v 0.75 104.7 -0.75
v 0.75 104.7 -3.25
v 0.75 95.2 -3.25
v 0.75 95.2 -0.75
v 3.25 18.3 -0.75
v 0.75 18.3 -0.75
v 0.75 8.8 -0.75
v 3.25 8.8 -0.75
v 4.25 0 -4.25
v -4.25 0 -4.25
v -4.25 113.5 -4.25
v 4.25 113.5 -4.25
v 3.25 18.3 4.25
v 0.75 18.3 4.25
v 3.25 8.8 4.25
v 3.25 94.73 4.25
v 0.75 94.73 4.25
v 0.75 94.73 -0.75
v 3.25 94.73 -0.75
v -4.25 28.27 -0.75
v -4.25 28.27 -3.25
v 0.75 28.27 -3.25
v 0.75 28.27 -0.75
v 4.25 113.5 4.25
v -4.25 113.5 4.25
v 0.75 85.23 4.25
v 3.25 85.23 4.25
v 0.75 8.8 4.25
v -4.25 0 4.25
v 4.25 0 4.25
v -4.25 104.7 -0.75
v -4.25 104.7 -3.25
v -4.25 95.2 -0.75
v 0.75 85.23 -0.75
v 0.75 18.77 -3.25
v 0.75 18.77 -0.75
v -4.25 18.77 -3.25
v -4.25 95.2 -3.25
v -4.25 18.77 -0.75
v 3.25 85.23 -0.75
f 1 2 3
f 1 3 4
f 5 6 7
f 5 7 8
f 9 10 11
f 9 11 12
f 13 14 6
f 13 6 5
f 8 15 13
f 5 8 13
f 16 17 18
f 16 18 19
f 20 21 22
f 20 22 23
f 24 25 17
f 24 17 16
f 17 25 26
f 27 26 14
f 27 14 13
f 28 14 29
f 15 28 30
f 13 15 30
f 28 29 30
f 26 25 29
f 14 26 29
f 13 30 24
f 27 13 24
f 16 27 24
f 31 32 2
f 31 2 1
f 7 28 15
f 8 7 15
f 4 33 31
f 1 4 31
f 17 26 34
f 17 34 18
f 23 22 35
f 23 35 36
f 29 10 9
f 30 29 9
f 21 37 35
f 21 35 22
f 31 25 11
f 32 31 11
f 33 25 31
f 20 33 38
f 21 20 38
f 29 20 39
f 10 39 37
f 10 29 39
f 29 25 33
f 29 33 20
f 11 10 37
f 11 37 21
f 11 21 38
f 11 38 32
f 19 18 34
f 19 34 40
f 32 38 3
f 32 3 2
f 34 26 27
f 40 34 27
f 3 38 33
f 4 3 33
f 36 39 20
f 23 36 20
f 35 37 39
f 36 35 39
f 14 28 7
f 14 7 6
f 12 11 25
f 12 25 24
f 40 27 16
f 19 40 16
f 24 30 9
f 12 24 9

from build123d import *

# Parameters (mm, degrees)
SKETCH1_W           = 8.5
SKETCH1_H           = 8.5
BOSS_EXTRUDE1_DEPTH = 113.5
SKETCH2_W           = 2.5
SKETCH2_H           = 9.5
CUT_EXTRUDE1_DEPTH  = 5
SKETCH3_W           = 2.5
SKETCH3_H           = 9.5
CUT_EXTRUDE2_DEPTH  = 5


with BuildPart() as part:
    # Sketch1 → Boss-Extrude1 (new body)
    with BuildSketch(Plane(origin=(0, 0, 0), x_dir=(1, 0, 0), z_dir=(0, 1, 0))):
        Rectangle(SKETCH1_W, SKETCH1_H)
    extrude(amount=BOSS_EXTRUDE1_DEPTH)

    # Sketch2 → Cut-Extrude1 (cut)
    with BuildSketch(Plane.XY.offset(4.25)):
        with Locations((2, 13.55)):
            Rectangle(SKETCH2_W, SKETCH2_H)
        with Locations((2, 89.98)):
            Rectangle(SKETCH2_W, SKETCH2_H)
    extrude(amount=-CUT_EXTRUDE1_DEPTH, mode=Mode.SUBTRACT)

    # Sketch3 → Cut-Extrude2 (cut)
    with BuildSketch(Plane.ZY.offset(4.25)):
        with Locations((-2, 99.95)):
            Rectangle(SKETCH3_W, SKETCH3_H)
        with Locations((-2, 23.52)):
            Rectangle(SKETCH3_W, SKETCH3_H)
    extrude(amount=-CUT_EXTRUDE2_DEPTH, mode=Mode.SUBTRACT)


solid = part.part
